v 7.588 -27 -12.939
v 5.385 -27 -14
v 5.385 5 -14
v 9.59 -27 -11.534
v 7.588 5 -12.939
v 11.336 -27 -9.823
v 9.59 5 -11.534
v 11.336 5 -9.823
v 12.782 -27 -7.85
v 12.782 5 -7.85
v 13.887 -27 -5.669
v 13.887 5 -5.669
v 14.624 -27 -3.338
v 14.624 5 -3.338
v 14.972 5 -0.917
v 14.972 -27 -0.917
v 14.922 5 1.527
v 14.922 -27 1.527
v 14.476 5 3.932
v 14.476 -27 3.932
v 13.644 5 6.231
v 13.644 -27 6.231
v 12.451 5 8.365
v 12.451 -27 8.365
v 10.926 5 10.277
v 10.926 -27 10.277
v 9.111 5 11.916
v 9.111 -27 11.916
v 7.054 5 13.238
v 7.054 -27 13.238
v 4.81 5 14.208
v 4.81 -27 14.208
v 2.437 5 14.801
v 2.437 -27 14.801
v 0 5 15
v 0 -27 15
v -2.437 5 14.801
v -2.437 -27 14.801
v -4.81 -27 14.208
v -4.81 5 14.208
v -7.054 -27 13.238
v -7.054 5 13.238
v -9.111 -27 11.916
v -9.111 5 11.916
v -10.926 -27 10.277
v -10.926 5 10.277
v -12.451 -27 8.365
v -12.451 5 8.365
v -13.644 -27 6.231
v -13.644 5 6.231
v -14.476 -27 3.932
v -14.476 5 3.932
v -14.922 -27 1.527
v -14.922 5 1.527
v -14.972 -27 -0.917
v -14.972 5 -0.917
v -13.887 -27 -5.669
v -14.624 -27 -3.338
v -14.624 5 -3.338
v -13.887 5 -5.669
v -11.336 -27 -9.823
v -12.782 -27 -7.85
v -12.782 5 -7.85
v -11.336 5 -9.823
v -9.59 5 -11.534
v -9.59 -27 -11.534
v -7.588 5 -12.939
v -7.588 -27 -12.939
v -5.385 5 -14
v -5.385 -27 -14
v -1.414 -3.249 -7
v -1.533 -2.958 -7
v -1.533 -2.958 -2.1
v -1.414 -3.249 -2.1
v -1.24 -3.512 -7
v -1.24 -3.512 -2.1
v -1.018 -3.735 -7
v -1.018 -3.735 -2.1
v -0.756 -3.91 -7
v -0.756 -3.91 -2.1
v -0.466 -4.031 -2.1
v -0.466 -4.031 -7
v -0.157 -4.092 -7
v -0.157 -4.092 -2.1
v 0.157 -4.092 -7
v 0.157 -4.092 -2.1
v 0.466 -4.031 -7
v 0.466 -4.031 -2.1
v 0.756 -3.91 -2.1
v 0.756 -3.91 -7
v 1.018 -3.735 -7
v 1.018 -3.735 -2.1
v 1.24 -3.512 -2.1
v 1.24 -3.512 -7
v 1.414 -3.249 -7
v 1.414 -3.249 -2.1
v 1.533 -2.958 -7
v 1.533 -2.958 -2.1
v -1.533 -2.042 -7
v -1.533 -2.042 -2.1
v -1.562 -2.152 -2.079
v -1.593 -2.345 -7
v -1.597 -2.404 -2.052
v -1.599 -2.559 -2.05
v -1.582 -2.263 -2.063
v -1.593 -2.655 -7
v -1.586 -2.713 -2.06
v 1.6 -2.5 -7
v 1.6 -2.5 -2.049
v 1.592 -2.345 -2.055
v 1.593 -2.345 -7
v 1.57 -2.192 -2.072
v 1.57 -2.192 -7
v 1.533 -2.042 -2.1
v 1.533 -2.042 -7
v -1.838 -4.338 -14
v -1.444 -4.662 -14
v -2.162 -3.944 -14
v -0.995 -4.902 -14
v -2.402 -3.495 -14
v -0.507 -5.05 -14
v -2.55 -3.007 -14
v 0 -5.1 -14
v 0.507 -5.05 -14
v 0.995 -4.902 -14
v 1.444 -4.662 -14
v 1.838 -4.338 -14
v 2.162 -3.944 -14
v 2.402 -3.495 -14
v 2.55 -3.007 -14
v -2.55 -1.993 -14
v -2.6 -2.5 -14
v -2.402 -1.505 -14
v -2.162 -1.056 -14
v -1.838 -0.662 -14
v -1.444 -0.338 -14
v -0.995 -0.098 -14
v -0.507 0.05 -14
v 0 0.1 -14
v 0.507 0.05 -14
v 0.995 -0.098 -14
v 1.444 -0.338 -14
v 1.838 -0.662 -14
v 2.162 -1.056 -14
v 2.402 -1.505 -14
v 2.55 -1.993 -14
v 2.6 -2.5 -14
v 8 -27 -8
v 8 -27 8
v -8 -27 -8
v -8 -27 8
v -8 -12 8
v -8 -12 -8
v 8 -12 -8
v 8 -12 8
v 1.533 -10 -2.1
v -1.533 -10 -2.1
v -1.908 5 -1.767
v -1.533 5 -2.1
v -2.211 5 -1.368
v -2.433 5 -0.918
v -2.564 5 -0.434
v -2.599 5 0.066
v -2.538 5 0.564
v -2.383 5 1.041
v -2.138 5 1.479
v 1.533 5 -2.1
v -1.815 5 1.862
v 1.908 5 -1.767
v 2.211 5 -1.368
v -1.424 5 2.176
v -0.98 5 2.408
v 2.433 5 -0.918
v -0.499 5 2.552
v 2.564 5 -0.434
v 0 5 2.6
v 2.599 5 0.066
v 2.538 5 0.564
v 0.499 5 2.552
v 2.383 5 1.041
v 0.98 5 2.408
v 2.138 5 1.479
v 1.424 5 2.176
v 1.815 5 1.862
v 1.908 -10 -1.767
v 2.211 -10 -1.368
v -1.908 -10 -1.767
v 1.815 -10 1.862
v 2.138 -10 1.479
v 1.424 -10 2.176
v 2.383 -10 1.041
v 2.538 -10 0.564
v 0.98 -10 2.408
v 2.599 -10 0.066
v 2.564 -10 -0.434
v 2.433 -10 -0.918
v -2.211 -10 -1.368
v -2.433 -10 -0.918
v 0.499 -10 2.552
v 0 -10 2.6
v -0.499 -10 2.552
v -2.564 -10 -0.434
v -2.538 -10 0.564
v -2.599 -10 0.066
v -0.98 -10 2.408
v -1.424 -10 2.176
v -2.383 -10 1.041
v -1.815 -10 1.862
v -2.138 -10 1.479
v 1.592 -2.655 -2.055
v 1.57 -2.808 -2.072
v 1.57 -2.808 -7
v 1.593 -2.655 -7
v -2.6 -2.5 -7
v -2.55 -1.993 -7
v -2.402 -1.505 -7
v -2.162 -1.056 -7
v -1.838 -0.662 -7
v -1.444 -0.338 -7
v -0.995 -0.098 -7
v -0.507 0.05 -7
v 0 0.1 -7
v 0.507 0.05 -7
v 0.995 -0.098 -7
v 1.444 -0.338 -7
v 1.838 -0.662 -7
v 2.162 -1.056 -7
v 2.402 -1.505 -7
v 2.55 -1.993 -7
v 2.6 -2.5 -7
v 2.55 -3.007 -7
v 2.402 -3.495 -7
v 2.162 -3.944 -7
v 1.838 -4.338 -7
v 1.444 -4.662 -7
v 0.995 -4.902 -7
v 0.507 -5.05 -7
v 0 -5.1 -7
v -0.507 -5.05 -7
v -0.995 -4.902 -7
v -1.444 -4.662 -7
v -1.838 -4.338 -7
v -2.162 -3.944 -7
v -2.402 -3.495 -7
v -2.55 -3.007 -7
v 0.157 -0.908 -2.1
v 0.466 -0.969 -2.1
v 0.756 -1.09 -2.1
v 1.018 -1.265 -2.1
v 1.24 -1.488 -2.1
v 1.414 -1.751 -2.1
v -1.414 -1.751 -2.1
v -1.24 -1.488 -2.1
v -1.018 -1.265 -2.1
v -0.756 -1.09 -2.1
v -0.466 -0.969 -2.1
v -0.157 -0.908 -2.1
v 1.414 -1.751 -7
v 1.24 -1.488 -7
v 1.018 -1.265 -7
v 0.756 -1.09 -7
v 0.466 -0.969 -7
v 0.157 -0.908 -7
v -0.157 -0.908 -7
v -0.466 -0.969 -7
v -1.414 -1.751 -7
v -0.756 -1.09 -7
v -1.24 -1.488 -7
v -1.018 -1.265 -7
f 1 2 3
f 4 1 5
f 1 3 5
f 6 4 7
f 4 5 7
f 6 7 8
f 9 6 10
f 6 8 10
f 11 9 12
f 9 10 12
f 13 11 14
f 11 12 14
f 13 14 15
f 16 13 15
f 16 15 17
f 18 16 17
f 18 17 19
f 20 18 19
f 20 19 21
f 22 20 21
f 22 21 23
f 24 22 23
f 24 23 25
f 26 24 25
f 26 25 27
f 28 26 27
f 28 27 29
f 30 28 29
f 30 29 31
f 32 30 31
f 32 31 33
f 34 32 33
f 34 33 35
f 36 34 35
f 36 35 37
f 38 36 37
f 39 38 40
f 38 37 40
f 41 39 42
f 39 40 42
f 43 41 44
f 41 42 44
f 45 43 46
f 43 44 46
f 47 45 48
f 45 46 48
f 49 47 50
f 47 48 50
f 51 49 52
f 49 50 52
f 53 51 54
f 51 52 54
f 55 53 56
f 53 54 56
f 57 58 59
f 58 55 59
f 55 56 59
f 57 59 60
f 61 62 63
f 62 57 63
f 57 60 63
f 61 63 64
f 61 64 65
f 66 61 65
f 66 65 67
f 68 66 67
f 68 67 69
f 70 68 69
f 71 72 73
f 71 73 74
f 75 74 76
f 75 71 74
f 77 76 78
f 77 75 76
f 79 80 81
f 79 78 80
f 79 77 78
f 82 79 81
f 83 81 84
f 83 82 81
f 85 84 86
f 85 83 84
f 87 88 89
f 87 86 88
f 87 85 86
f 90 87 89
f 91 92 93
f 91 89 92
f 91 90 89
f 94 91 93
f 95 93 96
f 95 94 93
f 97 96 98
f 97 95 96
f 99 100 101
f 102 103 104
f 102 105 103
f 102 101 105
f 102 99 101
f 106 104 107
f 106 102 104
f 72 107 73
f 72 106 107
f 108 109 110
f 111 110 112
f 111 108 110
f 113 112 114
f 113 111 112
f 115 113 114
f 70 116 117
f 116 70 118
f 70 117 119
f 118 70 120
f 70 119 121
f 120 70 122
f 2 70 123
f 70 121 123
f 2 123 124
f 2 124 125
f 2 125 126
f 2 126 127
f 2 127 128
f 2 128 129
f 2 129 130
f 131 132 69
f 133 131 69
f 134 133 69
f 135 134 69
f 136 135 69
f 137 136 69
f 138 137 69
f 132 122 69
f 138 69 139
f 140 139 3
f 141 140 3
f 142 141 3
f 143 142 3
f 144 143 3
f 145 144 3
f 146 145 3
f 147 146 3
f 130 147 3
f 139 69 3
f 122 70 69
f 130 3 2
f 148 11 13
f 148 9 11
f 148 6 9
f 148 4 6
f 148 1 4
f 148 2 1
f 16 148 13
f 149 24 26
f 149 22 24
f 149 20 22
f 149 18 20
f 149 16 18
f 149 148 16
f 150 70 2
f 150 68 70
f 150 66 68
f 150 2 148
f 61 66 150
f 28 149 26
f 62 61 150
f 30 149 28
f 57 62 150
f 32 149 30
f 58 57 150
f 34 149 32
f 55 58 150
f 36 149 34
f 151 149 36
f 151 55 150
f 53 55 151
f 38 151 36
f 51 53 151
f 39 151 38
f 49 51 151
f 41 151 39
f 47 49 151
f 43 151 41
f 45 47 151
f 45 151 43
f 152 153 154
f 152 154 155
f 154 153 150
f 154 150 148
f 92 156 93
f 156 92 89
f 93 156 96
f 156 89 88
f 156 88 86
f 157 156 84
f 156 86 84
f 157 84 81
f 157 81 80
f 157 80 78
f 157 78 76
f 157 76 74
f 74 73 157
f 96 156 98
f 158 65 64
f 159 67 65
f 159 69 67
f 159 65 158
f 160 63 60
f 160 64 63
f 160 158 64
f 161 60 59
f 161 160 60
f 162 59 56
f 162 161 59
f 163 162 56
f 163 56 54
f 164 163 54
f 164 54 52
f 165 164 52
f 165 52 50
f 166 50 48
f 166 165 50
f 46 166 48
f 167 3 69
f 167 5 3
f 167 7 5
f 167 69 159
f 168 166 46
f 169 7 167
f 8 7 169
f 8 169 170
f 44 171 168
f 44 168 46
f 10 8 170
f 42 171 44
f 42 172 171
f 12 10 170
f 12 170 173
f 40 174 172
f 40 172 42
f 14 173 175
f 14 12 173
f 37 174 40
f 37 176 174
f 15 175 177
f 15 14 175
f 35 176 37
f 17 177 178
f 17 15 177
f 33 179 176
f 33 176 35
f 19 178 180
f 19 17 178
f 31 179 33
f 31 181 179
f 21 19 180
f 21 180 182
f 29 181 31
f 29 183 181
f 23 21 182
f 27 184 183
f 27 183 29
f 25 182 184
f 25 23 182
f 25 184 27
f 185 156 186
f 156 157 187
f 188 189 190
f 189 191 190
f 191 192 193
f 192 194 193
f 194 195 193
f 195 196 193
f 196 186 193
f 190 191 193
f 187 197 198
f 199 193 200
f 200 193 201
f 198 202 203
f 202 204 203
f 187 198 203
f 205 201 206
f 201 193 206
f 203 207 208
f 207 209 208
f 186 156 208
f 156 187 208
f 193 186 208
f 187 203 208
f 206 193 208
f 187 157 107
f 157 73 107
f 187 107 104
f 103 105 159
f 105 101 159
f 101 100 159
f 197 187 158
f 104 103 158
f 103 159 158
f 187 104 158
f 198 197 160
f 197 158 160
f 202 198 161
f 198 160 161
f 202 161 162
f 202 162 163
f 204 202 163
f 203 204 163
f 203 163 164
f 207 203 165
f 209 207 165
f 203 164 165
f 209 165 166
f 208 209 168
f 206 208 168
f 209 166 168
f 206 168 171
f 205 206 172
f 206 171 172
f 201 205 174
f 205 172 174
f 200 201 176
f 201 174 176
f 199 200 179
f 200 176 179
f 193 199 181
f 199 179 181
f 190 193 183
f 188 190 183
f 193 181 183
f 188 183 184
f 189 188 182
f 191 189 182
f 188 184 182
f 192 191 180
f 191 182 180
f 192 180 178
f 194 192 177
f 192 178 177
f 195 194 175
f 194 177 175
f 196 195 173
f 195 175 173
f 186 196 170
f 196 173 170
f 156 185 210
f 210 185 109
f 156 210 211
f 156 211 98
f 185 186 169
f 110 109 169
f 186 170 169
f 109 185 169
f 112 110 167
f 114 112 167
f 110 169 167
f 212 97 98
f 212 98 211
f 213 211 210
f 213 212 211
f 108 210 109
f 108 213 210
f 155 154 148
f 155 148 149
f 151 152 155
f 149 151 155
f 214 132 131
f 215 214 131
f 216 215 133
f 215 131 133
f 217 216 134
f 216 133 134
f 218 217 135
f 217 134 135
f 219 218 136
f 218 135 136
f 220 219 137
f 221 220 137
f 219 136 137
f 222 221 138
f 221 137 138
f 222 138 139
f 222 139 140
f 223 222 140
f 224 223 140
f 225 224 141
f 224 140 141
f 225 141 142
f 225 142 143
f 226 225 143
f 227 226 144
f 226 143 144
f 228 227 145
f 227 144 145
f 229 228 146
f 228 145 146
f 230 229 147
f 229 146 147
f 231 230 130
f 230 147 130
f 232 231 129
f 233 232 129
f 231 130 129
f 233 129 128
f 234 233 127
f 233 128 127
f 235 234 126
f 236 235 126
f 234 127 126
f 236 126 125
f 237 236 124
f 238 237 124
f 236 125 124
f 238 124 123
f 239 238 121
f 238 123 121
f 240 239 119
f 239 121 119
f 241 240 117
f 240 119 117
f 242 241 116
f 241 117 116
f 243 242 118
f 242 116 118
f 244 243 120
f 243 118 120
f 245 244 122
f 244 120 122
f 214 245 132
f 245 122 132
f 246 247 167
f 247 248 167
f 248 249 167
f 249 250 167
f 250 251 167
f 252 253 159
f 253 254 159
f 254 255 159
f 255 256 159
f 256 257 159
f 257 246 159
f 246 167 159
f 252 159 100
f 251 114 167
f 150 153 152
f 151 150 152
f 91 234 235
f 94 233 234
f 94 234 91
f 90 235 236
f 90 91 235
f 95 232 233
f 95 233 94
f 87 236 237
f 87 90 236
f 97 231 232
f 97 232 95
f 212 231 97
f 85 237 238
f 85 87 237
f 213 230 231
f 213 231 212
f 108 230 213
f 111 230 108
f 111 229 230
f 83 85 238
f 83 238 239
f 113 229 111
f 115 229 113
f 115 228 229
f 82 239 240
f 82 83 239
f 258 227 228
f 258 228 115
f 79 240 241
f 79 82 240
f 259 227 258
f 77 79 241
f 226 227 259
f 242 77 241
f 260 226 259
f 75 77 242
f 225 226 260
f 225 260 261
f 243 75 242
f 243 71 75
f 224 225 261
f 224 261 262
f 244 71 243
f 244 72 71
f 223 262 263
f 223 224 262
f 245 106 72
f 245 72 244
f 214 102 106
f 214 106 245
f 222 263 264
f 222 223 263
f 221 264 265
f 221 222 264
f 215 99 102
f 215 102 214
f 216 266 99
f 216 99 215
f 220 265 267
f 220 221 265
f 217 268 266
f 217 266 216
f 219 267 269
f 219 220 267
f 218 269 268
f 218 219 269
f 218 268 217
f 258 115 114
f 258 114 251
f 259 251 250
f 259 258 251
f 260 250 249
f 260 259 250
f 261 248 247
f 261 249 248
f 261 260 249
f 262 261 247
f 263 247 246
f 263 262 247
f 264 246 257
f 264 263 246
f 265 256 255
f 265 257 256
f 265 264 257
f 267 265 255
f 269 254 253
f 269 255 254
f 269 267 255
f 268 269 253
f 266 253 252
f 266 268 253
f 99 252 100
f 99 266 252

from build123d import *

# Parameters (mm, degrees)
SKETCH1_R               = 6
BOSS_EXTRUDE1_DEPTH     = 5
BOSS_EXTRUDE2_START     = -5
BOSS_EXTRUDE2_DEPTH     = 5
CUT_EXTRUDE1_DEPTH      = 5
SKETCH4_R               = 15
BOSS_EXTRUDE3_DEPTH     = 15
SKETCH5_R               = 15
BOSS_EXTRUDE4_DEPTH     = 2
SKETCH6_R               = 15
SKETCH6_W               = 16
SKETCH6_H               = 16
BOSS_EXTRUDE5_DEPTH     = 15
CUT_EXTRUDE2_DEPTH      = 51
CUT_EXTRUDE5_DEPTH      = 1
CUT_EXTRUDE5_DEPTH_BACK = 51
SKETCH10_R              = 2.6
CUT_EXTRUDE6_DEPTH      = 7


with BuildPart() as part:
    # Sketch1 → Boss-Extrude1 (new body)
    with BuildSketch(Plane(origin=(0, 0, 0), x_dir=(1, 0, 0), z_dir=(0, 1, 0))):
        with Locations(Location((0, 0, 0), (0, 0, 270))):
            Circle(SKETCH1_R)
        with BuildLine():
            ThreePointArc((-1.549193338, 2.15), (0, -2.65), (1.549193338, 2.15))
            Line((1.549193338, 2.15), (-1.549193338, 2.15))
        make_face(mode=Mode.SUBTRACT)
    extrude(amount=BOSS_EXTRUDE1_DEPTH)

    # Sketch2 → Boss-Extrude2 (add)
    with BuildSketch(Plane(origin=(0, 5, 0), x_dir=(1, 0, 0), z_dir=(0, 1, 0)).offset(BOSS_EXTRUDE2_START)):
        with BuildLine():
            Line((1.549193338, 2.15), (-1.549193338, 2.15))
            ThreePointArc((-1.549193338, 2.15), (0, -2.65), (1.549193338, 2.15))
        make_face()
        with BuildLine():
            Line((1.526433752, 2.08), (-1.526433752, 2.08))
            ThreePointArc((-1.526433752, 2.08), (0, -2.58), (1.526433752, 2.08))
        make_face(mode=Mode.SUBTRACT)
    extrude(amount=BOSS_EXTRUDE2_DEPTH)

    # Sketch3 → Cut-Extrude1 (cut)
    with BuildSketch(Plane(origin=(0, 5, 0), x_dir=(1, 0, 0), z_dir=(0, 1, 0))):
        with BuildLine():
            Line((1.532970972, 2.1), (-1.532970972, 2.1))
            ThreePointArc((-1.532970972, 2.1), (0, -2.6), (1.532970972, 2.1))
        make_face()
    extrude(amount=-CUT_EXTRUDE1_DEPTH, mode=Mode.SUBTRACT)

    # Sketch4 → Boss-Extrude3 (add)
    with BuildSketch(Plane(origin=(0, 5, 0), x_dir=(1, 0, 0), z_dir=(0, 1, 0))):
        with Locations(Location((0, 0, 0), (0, 0, 270))):
            Circle(SKETCH4_R)
        with BuildLine():
            Line((1.532970972, 2.1), (-1.532970972, 2.1))
            ThreePointArc((-1.532970972, 2.1), (0, -2.6), (1.532970972, 2.1))
        make_face(mode=Mode.SUBTRACT)
    extrude(amount=-BOSS_EXTRUDE3_DEPTH)

    # Sketch5 → Boss-Extrude4 (add)
    with BuildSketch(Plane.XZ.offset(10)):
        with Locations(Location((0, 0, 0), (0, 0, 90))):
            Circle(SKETCH5_R)
    extrude(amount=BOSS_EXTRUDE4_DEPTH)

    # Sketch6 → Boss-Extrude5 (add)
    with BuildSketch(Plane.XZ.offset(12)):
        with Locations(Location((0, 0, 0), (0, 0, 90))):
            Circle(SKETCH6_R)
        Rectangle(SKETCH6_W, SKETCH6_H, mode=Mode.SUBTRACT)
    extrude(amount=BOSS_EXTRUDE5_DEPTH)

    # Sketch7 → Cut-Extrude2 (cut)
    with BuildSketch(Plane(origin=(0, 5, 0), x_dir=(1, 0, 0), z_dir=(0, 1, 0))):
        with BuildLine():
            Line((0, 14), (0, 15))
            ThreePointArc((0, 15), (-2.738612788, 14.747881204), (-5.385164807, 14))
            Line((-5.385164807, 14), (0, 14))
        make_face()
        with BuildLine():
            ThreePointArc((5.385164807, 14), (2.738612788, 14.747881204), (0, 15))
            Line((0, 15), (0, 14))
            Line((0, 14), (5.385164807, 14))
        make_face()
    extrude(amount=-CUT_EXTRUDE2_DEPTH, mode=Mode.SUBTRACT)

    # Sketch8 → Cut-Extrude5 (cut, two sides: drawn at the far end of the back side and taken through both)
    with BuildSketch(Plane.XY.offset(-2.1).offset(-CUT_EXTRUDE5_DEPTH_BACK)):
        with BuildLine():
            Line((1.532970972, -2.041742431), (1.532970972, -2.5))
            Line((1.532970972, -2.5), (1.532970972, -2.958257569))
            ThreePointArc((1.532970972, -2.958257569), (1.58315406, -2.731566886), (1.6, -2.5))
            ThreePointArc((1.6, -2.5), (1.58315406, -2.268433114), (1.532970972, -2.041742431))
        make_face()
        with BuildLine():
            Line((-1.532970972, -2.041742431), (-1.532970972, -2.5))
            Line((-1.532970972, -2.5), (1.532970972, -2.5))
            Line((1.532970972, -2.5), (1.532970972, -2.041742431))
            ThreePointArc((1.532970972, -2.041742431), (0, -0.9), (-1.532970972, -2.041742431))
        make_face()
        with BuildLine():
            Line((1.532970972, -2.5), (-1.532970972, -2.5))
            Line((-1.532970972, -2.5), (-1.532970972, -2.958257569))
            ThreePointArc((-1.532970972, -2.958257569), (0, -4.1), (1.532970972, -2.958257569))
            Line((1.532970972, -2.958257569), (1.532970972, -2.5))
        make_face()
        with BuildLine():
            Line((-1.532970972, -2.958257569), (-1.532970972, -2.5))
            Line((-1.532970972, -2.5), (-1.532970972, -2.041742431))
            ThreePointArc((-1.532970972, -2.041742431), (-1.6, -2.5), (-1.532970972, -2.958257569))
        make_face()
    extrude(amount=CUT_EXTRUDE5_DEPTH + CUT_EXTRUDE5_DEPTH_BACK, mode=Mode.SUBTRACT)

    # Sketch10 → Cut-Extrude6 (cut)
    with BuildSketch(Plane(origin=(0, 0, -14), x_dir=(-1, 0, 0), z_dir=(0, 0, -1))):
        with Locations((0, -2.5)):
            Circle(SKETCH10_R)
    extrude(amount=-CUT_EXTRUDE6_DEPTH, mode=Mode.SUBTRACT)


solid = part.part
